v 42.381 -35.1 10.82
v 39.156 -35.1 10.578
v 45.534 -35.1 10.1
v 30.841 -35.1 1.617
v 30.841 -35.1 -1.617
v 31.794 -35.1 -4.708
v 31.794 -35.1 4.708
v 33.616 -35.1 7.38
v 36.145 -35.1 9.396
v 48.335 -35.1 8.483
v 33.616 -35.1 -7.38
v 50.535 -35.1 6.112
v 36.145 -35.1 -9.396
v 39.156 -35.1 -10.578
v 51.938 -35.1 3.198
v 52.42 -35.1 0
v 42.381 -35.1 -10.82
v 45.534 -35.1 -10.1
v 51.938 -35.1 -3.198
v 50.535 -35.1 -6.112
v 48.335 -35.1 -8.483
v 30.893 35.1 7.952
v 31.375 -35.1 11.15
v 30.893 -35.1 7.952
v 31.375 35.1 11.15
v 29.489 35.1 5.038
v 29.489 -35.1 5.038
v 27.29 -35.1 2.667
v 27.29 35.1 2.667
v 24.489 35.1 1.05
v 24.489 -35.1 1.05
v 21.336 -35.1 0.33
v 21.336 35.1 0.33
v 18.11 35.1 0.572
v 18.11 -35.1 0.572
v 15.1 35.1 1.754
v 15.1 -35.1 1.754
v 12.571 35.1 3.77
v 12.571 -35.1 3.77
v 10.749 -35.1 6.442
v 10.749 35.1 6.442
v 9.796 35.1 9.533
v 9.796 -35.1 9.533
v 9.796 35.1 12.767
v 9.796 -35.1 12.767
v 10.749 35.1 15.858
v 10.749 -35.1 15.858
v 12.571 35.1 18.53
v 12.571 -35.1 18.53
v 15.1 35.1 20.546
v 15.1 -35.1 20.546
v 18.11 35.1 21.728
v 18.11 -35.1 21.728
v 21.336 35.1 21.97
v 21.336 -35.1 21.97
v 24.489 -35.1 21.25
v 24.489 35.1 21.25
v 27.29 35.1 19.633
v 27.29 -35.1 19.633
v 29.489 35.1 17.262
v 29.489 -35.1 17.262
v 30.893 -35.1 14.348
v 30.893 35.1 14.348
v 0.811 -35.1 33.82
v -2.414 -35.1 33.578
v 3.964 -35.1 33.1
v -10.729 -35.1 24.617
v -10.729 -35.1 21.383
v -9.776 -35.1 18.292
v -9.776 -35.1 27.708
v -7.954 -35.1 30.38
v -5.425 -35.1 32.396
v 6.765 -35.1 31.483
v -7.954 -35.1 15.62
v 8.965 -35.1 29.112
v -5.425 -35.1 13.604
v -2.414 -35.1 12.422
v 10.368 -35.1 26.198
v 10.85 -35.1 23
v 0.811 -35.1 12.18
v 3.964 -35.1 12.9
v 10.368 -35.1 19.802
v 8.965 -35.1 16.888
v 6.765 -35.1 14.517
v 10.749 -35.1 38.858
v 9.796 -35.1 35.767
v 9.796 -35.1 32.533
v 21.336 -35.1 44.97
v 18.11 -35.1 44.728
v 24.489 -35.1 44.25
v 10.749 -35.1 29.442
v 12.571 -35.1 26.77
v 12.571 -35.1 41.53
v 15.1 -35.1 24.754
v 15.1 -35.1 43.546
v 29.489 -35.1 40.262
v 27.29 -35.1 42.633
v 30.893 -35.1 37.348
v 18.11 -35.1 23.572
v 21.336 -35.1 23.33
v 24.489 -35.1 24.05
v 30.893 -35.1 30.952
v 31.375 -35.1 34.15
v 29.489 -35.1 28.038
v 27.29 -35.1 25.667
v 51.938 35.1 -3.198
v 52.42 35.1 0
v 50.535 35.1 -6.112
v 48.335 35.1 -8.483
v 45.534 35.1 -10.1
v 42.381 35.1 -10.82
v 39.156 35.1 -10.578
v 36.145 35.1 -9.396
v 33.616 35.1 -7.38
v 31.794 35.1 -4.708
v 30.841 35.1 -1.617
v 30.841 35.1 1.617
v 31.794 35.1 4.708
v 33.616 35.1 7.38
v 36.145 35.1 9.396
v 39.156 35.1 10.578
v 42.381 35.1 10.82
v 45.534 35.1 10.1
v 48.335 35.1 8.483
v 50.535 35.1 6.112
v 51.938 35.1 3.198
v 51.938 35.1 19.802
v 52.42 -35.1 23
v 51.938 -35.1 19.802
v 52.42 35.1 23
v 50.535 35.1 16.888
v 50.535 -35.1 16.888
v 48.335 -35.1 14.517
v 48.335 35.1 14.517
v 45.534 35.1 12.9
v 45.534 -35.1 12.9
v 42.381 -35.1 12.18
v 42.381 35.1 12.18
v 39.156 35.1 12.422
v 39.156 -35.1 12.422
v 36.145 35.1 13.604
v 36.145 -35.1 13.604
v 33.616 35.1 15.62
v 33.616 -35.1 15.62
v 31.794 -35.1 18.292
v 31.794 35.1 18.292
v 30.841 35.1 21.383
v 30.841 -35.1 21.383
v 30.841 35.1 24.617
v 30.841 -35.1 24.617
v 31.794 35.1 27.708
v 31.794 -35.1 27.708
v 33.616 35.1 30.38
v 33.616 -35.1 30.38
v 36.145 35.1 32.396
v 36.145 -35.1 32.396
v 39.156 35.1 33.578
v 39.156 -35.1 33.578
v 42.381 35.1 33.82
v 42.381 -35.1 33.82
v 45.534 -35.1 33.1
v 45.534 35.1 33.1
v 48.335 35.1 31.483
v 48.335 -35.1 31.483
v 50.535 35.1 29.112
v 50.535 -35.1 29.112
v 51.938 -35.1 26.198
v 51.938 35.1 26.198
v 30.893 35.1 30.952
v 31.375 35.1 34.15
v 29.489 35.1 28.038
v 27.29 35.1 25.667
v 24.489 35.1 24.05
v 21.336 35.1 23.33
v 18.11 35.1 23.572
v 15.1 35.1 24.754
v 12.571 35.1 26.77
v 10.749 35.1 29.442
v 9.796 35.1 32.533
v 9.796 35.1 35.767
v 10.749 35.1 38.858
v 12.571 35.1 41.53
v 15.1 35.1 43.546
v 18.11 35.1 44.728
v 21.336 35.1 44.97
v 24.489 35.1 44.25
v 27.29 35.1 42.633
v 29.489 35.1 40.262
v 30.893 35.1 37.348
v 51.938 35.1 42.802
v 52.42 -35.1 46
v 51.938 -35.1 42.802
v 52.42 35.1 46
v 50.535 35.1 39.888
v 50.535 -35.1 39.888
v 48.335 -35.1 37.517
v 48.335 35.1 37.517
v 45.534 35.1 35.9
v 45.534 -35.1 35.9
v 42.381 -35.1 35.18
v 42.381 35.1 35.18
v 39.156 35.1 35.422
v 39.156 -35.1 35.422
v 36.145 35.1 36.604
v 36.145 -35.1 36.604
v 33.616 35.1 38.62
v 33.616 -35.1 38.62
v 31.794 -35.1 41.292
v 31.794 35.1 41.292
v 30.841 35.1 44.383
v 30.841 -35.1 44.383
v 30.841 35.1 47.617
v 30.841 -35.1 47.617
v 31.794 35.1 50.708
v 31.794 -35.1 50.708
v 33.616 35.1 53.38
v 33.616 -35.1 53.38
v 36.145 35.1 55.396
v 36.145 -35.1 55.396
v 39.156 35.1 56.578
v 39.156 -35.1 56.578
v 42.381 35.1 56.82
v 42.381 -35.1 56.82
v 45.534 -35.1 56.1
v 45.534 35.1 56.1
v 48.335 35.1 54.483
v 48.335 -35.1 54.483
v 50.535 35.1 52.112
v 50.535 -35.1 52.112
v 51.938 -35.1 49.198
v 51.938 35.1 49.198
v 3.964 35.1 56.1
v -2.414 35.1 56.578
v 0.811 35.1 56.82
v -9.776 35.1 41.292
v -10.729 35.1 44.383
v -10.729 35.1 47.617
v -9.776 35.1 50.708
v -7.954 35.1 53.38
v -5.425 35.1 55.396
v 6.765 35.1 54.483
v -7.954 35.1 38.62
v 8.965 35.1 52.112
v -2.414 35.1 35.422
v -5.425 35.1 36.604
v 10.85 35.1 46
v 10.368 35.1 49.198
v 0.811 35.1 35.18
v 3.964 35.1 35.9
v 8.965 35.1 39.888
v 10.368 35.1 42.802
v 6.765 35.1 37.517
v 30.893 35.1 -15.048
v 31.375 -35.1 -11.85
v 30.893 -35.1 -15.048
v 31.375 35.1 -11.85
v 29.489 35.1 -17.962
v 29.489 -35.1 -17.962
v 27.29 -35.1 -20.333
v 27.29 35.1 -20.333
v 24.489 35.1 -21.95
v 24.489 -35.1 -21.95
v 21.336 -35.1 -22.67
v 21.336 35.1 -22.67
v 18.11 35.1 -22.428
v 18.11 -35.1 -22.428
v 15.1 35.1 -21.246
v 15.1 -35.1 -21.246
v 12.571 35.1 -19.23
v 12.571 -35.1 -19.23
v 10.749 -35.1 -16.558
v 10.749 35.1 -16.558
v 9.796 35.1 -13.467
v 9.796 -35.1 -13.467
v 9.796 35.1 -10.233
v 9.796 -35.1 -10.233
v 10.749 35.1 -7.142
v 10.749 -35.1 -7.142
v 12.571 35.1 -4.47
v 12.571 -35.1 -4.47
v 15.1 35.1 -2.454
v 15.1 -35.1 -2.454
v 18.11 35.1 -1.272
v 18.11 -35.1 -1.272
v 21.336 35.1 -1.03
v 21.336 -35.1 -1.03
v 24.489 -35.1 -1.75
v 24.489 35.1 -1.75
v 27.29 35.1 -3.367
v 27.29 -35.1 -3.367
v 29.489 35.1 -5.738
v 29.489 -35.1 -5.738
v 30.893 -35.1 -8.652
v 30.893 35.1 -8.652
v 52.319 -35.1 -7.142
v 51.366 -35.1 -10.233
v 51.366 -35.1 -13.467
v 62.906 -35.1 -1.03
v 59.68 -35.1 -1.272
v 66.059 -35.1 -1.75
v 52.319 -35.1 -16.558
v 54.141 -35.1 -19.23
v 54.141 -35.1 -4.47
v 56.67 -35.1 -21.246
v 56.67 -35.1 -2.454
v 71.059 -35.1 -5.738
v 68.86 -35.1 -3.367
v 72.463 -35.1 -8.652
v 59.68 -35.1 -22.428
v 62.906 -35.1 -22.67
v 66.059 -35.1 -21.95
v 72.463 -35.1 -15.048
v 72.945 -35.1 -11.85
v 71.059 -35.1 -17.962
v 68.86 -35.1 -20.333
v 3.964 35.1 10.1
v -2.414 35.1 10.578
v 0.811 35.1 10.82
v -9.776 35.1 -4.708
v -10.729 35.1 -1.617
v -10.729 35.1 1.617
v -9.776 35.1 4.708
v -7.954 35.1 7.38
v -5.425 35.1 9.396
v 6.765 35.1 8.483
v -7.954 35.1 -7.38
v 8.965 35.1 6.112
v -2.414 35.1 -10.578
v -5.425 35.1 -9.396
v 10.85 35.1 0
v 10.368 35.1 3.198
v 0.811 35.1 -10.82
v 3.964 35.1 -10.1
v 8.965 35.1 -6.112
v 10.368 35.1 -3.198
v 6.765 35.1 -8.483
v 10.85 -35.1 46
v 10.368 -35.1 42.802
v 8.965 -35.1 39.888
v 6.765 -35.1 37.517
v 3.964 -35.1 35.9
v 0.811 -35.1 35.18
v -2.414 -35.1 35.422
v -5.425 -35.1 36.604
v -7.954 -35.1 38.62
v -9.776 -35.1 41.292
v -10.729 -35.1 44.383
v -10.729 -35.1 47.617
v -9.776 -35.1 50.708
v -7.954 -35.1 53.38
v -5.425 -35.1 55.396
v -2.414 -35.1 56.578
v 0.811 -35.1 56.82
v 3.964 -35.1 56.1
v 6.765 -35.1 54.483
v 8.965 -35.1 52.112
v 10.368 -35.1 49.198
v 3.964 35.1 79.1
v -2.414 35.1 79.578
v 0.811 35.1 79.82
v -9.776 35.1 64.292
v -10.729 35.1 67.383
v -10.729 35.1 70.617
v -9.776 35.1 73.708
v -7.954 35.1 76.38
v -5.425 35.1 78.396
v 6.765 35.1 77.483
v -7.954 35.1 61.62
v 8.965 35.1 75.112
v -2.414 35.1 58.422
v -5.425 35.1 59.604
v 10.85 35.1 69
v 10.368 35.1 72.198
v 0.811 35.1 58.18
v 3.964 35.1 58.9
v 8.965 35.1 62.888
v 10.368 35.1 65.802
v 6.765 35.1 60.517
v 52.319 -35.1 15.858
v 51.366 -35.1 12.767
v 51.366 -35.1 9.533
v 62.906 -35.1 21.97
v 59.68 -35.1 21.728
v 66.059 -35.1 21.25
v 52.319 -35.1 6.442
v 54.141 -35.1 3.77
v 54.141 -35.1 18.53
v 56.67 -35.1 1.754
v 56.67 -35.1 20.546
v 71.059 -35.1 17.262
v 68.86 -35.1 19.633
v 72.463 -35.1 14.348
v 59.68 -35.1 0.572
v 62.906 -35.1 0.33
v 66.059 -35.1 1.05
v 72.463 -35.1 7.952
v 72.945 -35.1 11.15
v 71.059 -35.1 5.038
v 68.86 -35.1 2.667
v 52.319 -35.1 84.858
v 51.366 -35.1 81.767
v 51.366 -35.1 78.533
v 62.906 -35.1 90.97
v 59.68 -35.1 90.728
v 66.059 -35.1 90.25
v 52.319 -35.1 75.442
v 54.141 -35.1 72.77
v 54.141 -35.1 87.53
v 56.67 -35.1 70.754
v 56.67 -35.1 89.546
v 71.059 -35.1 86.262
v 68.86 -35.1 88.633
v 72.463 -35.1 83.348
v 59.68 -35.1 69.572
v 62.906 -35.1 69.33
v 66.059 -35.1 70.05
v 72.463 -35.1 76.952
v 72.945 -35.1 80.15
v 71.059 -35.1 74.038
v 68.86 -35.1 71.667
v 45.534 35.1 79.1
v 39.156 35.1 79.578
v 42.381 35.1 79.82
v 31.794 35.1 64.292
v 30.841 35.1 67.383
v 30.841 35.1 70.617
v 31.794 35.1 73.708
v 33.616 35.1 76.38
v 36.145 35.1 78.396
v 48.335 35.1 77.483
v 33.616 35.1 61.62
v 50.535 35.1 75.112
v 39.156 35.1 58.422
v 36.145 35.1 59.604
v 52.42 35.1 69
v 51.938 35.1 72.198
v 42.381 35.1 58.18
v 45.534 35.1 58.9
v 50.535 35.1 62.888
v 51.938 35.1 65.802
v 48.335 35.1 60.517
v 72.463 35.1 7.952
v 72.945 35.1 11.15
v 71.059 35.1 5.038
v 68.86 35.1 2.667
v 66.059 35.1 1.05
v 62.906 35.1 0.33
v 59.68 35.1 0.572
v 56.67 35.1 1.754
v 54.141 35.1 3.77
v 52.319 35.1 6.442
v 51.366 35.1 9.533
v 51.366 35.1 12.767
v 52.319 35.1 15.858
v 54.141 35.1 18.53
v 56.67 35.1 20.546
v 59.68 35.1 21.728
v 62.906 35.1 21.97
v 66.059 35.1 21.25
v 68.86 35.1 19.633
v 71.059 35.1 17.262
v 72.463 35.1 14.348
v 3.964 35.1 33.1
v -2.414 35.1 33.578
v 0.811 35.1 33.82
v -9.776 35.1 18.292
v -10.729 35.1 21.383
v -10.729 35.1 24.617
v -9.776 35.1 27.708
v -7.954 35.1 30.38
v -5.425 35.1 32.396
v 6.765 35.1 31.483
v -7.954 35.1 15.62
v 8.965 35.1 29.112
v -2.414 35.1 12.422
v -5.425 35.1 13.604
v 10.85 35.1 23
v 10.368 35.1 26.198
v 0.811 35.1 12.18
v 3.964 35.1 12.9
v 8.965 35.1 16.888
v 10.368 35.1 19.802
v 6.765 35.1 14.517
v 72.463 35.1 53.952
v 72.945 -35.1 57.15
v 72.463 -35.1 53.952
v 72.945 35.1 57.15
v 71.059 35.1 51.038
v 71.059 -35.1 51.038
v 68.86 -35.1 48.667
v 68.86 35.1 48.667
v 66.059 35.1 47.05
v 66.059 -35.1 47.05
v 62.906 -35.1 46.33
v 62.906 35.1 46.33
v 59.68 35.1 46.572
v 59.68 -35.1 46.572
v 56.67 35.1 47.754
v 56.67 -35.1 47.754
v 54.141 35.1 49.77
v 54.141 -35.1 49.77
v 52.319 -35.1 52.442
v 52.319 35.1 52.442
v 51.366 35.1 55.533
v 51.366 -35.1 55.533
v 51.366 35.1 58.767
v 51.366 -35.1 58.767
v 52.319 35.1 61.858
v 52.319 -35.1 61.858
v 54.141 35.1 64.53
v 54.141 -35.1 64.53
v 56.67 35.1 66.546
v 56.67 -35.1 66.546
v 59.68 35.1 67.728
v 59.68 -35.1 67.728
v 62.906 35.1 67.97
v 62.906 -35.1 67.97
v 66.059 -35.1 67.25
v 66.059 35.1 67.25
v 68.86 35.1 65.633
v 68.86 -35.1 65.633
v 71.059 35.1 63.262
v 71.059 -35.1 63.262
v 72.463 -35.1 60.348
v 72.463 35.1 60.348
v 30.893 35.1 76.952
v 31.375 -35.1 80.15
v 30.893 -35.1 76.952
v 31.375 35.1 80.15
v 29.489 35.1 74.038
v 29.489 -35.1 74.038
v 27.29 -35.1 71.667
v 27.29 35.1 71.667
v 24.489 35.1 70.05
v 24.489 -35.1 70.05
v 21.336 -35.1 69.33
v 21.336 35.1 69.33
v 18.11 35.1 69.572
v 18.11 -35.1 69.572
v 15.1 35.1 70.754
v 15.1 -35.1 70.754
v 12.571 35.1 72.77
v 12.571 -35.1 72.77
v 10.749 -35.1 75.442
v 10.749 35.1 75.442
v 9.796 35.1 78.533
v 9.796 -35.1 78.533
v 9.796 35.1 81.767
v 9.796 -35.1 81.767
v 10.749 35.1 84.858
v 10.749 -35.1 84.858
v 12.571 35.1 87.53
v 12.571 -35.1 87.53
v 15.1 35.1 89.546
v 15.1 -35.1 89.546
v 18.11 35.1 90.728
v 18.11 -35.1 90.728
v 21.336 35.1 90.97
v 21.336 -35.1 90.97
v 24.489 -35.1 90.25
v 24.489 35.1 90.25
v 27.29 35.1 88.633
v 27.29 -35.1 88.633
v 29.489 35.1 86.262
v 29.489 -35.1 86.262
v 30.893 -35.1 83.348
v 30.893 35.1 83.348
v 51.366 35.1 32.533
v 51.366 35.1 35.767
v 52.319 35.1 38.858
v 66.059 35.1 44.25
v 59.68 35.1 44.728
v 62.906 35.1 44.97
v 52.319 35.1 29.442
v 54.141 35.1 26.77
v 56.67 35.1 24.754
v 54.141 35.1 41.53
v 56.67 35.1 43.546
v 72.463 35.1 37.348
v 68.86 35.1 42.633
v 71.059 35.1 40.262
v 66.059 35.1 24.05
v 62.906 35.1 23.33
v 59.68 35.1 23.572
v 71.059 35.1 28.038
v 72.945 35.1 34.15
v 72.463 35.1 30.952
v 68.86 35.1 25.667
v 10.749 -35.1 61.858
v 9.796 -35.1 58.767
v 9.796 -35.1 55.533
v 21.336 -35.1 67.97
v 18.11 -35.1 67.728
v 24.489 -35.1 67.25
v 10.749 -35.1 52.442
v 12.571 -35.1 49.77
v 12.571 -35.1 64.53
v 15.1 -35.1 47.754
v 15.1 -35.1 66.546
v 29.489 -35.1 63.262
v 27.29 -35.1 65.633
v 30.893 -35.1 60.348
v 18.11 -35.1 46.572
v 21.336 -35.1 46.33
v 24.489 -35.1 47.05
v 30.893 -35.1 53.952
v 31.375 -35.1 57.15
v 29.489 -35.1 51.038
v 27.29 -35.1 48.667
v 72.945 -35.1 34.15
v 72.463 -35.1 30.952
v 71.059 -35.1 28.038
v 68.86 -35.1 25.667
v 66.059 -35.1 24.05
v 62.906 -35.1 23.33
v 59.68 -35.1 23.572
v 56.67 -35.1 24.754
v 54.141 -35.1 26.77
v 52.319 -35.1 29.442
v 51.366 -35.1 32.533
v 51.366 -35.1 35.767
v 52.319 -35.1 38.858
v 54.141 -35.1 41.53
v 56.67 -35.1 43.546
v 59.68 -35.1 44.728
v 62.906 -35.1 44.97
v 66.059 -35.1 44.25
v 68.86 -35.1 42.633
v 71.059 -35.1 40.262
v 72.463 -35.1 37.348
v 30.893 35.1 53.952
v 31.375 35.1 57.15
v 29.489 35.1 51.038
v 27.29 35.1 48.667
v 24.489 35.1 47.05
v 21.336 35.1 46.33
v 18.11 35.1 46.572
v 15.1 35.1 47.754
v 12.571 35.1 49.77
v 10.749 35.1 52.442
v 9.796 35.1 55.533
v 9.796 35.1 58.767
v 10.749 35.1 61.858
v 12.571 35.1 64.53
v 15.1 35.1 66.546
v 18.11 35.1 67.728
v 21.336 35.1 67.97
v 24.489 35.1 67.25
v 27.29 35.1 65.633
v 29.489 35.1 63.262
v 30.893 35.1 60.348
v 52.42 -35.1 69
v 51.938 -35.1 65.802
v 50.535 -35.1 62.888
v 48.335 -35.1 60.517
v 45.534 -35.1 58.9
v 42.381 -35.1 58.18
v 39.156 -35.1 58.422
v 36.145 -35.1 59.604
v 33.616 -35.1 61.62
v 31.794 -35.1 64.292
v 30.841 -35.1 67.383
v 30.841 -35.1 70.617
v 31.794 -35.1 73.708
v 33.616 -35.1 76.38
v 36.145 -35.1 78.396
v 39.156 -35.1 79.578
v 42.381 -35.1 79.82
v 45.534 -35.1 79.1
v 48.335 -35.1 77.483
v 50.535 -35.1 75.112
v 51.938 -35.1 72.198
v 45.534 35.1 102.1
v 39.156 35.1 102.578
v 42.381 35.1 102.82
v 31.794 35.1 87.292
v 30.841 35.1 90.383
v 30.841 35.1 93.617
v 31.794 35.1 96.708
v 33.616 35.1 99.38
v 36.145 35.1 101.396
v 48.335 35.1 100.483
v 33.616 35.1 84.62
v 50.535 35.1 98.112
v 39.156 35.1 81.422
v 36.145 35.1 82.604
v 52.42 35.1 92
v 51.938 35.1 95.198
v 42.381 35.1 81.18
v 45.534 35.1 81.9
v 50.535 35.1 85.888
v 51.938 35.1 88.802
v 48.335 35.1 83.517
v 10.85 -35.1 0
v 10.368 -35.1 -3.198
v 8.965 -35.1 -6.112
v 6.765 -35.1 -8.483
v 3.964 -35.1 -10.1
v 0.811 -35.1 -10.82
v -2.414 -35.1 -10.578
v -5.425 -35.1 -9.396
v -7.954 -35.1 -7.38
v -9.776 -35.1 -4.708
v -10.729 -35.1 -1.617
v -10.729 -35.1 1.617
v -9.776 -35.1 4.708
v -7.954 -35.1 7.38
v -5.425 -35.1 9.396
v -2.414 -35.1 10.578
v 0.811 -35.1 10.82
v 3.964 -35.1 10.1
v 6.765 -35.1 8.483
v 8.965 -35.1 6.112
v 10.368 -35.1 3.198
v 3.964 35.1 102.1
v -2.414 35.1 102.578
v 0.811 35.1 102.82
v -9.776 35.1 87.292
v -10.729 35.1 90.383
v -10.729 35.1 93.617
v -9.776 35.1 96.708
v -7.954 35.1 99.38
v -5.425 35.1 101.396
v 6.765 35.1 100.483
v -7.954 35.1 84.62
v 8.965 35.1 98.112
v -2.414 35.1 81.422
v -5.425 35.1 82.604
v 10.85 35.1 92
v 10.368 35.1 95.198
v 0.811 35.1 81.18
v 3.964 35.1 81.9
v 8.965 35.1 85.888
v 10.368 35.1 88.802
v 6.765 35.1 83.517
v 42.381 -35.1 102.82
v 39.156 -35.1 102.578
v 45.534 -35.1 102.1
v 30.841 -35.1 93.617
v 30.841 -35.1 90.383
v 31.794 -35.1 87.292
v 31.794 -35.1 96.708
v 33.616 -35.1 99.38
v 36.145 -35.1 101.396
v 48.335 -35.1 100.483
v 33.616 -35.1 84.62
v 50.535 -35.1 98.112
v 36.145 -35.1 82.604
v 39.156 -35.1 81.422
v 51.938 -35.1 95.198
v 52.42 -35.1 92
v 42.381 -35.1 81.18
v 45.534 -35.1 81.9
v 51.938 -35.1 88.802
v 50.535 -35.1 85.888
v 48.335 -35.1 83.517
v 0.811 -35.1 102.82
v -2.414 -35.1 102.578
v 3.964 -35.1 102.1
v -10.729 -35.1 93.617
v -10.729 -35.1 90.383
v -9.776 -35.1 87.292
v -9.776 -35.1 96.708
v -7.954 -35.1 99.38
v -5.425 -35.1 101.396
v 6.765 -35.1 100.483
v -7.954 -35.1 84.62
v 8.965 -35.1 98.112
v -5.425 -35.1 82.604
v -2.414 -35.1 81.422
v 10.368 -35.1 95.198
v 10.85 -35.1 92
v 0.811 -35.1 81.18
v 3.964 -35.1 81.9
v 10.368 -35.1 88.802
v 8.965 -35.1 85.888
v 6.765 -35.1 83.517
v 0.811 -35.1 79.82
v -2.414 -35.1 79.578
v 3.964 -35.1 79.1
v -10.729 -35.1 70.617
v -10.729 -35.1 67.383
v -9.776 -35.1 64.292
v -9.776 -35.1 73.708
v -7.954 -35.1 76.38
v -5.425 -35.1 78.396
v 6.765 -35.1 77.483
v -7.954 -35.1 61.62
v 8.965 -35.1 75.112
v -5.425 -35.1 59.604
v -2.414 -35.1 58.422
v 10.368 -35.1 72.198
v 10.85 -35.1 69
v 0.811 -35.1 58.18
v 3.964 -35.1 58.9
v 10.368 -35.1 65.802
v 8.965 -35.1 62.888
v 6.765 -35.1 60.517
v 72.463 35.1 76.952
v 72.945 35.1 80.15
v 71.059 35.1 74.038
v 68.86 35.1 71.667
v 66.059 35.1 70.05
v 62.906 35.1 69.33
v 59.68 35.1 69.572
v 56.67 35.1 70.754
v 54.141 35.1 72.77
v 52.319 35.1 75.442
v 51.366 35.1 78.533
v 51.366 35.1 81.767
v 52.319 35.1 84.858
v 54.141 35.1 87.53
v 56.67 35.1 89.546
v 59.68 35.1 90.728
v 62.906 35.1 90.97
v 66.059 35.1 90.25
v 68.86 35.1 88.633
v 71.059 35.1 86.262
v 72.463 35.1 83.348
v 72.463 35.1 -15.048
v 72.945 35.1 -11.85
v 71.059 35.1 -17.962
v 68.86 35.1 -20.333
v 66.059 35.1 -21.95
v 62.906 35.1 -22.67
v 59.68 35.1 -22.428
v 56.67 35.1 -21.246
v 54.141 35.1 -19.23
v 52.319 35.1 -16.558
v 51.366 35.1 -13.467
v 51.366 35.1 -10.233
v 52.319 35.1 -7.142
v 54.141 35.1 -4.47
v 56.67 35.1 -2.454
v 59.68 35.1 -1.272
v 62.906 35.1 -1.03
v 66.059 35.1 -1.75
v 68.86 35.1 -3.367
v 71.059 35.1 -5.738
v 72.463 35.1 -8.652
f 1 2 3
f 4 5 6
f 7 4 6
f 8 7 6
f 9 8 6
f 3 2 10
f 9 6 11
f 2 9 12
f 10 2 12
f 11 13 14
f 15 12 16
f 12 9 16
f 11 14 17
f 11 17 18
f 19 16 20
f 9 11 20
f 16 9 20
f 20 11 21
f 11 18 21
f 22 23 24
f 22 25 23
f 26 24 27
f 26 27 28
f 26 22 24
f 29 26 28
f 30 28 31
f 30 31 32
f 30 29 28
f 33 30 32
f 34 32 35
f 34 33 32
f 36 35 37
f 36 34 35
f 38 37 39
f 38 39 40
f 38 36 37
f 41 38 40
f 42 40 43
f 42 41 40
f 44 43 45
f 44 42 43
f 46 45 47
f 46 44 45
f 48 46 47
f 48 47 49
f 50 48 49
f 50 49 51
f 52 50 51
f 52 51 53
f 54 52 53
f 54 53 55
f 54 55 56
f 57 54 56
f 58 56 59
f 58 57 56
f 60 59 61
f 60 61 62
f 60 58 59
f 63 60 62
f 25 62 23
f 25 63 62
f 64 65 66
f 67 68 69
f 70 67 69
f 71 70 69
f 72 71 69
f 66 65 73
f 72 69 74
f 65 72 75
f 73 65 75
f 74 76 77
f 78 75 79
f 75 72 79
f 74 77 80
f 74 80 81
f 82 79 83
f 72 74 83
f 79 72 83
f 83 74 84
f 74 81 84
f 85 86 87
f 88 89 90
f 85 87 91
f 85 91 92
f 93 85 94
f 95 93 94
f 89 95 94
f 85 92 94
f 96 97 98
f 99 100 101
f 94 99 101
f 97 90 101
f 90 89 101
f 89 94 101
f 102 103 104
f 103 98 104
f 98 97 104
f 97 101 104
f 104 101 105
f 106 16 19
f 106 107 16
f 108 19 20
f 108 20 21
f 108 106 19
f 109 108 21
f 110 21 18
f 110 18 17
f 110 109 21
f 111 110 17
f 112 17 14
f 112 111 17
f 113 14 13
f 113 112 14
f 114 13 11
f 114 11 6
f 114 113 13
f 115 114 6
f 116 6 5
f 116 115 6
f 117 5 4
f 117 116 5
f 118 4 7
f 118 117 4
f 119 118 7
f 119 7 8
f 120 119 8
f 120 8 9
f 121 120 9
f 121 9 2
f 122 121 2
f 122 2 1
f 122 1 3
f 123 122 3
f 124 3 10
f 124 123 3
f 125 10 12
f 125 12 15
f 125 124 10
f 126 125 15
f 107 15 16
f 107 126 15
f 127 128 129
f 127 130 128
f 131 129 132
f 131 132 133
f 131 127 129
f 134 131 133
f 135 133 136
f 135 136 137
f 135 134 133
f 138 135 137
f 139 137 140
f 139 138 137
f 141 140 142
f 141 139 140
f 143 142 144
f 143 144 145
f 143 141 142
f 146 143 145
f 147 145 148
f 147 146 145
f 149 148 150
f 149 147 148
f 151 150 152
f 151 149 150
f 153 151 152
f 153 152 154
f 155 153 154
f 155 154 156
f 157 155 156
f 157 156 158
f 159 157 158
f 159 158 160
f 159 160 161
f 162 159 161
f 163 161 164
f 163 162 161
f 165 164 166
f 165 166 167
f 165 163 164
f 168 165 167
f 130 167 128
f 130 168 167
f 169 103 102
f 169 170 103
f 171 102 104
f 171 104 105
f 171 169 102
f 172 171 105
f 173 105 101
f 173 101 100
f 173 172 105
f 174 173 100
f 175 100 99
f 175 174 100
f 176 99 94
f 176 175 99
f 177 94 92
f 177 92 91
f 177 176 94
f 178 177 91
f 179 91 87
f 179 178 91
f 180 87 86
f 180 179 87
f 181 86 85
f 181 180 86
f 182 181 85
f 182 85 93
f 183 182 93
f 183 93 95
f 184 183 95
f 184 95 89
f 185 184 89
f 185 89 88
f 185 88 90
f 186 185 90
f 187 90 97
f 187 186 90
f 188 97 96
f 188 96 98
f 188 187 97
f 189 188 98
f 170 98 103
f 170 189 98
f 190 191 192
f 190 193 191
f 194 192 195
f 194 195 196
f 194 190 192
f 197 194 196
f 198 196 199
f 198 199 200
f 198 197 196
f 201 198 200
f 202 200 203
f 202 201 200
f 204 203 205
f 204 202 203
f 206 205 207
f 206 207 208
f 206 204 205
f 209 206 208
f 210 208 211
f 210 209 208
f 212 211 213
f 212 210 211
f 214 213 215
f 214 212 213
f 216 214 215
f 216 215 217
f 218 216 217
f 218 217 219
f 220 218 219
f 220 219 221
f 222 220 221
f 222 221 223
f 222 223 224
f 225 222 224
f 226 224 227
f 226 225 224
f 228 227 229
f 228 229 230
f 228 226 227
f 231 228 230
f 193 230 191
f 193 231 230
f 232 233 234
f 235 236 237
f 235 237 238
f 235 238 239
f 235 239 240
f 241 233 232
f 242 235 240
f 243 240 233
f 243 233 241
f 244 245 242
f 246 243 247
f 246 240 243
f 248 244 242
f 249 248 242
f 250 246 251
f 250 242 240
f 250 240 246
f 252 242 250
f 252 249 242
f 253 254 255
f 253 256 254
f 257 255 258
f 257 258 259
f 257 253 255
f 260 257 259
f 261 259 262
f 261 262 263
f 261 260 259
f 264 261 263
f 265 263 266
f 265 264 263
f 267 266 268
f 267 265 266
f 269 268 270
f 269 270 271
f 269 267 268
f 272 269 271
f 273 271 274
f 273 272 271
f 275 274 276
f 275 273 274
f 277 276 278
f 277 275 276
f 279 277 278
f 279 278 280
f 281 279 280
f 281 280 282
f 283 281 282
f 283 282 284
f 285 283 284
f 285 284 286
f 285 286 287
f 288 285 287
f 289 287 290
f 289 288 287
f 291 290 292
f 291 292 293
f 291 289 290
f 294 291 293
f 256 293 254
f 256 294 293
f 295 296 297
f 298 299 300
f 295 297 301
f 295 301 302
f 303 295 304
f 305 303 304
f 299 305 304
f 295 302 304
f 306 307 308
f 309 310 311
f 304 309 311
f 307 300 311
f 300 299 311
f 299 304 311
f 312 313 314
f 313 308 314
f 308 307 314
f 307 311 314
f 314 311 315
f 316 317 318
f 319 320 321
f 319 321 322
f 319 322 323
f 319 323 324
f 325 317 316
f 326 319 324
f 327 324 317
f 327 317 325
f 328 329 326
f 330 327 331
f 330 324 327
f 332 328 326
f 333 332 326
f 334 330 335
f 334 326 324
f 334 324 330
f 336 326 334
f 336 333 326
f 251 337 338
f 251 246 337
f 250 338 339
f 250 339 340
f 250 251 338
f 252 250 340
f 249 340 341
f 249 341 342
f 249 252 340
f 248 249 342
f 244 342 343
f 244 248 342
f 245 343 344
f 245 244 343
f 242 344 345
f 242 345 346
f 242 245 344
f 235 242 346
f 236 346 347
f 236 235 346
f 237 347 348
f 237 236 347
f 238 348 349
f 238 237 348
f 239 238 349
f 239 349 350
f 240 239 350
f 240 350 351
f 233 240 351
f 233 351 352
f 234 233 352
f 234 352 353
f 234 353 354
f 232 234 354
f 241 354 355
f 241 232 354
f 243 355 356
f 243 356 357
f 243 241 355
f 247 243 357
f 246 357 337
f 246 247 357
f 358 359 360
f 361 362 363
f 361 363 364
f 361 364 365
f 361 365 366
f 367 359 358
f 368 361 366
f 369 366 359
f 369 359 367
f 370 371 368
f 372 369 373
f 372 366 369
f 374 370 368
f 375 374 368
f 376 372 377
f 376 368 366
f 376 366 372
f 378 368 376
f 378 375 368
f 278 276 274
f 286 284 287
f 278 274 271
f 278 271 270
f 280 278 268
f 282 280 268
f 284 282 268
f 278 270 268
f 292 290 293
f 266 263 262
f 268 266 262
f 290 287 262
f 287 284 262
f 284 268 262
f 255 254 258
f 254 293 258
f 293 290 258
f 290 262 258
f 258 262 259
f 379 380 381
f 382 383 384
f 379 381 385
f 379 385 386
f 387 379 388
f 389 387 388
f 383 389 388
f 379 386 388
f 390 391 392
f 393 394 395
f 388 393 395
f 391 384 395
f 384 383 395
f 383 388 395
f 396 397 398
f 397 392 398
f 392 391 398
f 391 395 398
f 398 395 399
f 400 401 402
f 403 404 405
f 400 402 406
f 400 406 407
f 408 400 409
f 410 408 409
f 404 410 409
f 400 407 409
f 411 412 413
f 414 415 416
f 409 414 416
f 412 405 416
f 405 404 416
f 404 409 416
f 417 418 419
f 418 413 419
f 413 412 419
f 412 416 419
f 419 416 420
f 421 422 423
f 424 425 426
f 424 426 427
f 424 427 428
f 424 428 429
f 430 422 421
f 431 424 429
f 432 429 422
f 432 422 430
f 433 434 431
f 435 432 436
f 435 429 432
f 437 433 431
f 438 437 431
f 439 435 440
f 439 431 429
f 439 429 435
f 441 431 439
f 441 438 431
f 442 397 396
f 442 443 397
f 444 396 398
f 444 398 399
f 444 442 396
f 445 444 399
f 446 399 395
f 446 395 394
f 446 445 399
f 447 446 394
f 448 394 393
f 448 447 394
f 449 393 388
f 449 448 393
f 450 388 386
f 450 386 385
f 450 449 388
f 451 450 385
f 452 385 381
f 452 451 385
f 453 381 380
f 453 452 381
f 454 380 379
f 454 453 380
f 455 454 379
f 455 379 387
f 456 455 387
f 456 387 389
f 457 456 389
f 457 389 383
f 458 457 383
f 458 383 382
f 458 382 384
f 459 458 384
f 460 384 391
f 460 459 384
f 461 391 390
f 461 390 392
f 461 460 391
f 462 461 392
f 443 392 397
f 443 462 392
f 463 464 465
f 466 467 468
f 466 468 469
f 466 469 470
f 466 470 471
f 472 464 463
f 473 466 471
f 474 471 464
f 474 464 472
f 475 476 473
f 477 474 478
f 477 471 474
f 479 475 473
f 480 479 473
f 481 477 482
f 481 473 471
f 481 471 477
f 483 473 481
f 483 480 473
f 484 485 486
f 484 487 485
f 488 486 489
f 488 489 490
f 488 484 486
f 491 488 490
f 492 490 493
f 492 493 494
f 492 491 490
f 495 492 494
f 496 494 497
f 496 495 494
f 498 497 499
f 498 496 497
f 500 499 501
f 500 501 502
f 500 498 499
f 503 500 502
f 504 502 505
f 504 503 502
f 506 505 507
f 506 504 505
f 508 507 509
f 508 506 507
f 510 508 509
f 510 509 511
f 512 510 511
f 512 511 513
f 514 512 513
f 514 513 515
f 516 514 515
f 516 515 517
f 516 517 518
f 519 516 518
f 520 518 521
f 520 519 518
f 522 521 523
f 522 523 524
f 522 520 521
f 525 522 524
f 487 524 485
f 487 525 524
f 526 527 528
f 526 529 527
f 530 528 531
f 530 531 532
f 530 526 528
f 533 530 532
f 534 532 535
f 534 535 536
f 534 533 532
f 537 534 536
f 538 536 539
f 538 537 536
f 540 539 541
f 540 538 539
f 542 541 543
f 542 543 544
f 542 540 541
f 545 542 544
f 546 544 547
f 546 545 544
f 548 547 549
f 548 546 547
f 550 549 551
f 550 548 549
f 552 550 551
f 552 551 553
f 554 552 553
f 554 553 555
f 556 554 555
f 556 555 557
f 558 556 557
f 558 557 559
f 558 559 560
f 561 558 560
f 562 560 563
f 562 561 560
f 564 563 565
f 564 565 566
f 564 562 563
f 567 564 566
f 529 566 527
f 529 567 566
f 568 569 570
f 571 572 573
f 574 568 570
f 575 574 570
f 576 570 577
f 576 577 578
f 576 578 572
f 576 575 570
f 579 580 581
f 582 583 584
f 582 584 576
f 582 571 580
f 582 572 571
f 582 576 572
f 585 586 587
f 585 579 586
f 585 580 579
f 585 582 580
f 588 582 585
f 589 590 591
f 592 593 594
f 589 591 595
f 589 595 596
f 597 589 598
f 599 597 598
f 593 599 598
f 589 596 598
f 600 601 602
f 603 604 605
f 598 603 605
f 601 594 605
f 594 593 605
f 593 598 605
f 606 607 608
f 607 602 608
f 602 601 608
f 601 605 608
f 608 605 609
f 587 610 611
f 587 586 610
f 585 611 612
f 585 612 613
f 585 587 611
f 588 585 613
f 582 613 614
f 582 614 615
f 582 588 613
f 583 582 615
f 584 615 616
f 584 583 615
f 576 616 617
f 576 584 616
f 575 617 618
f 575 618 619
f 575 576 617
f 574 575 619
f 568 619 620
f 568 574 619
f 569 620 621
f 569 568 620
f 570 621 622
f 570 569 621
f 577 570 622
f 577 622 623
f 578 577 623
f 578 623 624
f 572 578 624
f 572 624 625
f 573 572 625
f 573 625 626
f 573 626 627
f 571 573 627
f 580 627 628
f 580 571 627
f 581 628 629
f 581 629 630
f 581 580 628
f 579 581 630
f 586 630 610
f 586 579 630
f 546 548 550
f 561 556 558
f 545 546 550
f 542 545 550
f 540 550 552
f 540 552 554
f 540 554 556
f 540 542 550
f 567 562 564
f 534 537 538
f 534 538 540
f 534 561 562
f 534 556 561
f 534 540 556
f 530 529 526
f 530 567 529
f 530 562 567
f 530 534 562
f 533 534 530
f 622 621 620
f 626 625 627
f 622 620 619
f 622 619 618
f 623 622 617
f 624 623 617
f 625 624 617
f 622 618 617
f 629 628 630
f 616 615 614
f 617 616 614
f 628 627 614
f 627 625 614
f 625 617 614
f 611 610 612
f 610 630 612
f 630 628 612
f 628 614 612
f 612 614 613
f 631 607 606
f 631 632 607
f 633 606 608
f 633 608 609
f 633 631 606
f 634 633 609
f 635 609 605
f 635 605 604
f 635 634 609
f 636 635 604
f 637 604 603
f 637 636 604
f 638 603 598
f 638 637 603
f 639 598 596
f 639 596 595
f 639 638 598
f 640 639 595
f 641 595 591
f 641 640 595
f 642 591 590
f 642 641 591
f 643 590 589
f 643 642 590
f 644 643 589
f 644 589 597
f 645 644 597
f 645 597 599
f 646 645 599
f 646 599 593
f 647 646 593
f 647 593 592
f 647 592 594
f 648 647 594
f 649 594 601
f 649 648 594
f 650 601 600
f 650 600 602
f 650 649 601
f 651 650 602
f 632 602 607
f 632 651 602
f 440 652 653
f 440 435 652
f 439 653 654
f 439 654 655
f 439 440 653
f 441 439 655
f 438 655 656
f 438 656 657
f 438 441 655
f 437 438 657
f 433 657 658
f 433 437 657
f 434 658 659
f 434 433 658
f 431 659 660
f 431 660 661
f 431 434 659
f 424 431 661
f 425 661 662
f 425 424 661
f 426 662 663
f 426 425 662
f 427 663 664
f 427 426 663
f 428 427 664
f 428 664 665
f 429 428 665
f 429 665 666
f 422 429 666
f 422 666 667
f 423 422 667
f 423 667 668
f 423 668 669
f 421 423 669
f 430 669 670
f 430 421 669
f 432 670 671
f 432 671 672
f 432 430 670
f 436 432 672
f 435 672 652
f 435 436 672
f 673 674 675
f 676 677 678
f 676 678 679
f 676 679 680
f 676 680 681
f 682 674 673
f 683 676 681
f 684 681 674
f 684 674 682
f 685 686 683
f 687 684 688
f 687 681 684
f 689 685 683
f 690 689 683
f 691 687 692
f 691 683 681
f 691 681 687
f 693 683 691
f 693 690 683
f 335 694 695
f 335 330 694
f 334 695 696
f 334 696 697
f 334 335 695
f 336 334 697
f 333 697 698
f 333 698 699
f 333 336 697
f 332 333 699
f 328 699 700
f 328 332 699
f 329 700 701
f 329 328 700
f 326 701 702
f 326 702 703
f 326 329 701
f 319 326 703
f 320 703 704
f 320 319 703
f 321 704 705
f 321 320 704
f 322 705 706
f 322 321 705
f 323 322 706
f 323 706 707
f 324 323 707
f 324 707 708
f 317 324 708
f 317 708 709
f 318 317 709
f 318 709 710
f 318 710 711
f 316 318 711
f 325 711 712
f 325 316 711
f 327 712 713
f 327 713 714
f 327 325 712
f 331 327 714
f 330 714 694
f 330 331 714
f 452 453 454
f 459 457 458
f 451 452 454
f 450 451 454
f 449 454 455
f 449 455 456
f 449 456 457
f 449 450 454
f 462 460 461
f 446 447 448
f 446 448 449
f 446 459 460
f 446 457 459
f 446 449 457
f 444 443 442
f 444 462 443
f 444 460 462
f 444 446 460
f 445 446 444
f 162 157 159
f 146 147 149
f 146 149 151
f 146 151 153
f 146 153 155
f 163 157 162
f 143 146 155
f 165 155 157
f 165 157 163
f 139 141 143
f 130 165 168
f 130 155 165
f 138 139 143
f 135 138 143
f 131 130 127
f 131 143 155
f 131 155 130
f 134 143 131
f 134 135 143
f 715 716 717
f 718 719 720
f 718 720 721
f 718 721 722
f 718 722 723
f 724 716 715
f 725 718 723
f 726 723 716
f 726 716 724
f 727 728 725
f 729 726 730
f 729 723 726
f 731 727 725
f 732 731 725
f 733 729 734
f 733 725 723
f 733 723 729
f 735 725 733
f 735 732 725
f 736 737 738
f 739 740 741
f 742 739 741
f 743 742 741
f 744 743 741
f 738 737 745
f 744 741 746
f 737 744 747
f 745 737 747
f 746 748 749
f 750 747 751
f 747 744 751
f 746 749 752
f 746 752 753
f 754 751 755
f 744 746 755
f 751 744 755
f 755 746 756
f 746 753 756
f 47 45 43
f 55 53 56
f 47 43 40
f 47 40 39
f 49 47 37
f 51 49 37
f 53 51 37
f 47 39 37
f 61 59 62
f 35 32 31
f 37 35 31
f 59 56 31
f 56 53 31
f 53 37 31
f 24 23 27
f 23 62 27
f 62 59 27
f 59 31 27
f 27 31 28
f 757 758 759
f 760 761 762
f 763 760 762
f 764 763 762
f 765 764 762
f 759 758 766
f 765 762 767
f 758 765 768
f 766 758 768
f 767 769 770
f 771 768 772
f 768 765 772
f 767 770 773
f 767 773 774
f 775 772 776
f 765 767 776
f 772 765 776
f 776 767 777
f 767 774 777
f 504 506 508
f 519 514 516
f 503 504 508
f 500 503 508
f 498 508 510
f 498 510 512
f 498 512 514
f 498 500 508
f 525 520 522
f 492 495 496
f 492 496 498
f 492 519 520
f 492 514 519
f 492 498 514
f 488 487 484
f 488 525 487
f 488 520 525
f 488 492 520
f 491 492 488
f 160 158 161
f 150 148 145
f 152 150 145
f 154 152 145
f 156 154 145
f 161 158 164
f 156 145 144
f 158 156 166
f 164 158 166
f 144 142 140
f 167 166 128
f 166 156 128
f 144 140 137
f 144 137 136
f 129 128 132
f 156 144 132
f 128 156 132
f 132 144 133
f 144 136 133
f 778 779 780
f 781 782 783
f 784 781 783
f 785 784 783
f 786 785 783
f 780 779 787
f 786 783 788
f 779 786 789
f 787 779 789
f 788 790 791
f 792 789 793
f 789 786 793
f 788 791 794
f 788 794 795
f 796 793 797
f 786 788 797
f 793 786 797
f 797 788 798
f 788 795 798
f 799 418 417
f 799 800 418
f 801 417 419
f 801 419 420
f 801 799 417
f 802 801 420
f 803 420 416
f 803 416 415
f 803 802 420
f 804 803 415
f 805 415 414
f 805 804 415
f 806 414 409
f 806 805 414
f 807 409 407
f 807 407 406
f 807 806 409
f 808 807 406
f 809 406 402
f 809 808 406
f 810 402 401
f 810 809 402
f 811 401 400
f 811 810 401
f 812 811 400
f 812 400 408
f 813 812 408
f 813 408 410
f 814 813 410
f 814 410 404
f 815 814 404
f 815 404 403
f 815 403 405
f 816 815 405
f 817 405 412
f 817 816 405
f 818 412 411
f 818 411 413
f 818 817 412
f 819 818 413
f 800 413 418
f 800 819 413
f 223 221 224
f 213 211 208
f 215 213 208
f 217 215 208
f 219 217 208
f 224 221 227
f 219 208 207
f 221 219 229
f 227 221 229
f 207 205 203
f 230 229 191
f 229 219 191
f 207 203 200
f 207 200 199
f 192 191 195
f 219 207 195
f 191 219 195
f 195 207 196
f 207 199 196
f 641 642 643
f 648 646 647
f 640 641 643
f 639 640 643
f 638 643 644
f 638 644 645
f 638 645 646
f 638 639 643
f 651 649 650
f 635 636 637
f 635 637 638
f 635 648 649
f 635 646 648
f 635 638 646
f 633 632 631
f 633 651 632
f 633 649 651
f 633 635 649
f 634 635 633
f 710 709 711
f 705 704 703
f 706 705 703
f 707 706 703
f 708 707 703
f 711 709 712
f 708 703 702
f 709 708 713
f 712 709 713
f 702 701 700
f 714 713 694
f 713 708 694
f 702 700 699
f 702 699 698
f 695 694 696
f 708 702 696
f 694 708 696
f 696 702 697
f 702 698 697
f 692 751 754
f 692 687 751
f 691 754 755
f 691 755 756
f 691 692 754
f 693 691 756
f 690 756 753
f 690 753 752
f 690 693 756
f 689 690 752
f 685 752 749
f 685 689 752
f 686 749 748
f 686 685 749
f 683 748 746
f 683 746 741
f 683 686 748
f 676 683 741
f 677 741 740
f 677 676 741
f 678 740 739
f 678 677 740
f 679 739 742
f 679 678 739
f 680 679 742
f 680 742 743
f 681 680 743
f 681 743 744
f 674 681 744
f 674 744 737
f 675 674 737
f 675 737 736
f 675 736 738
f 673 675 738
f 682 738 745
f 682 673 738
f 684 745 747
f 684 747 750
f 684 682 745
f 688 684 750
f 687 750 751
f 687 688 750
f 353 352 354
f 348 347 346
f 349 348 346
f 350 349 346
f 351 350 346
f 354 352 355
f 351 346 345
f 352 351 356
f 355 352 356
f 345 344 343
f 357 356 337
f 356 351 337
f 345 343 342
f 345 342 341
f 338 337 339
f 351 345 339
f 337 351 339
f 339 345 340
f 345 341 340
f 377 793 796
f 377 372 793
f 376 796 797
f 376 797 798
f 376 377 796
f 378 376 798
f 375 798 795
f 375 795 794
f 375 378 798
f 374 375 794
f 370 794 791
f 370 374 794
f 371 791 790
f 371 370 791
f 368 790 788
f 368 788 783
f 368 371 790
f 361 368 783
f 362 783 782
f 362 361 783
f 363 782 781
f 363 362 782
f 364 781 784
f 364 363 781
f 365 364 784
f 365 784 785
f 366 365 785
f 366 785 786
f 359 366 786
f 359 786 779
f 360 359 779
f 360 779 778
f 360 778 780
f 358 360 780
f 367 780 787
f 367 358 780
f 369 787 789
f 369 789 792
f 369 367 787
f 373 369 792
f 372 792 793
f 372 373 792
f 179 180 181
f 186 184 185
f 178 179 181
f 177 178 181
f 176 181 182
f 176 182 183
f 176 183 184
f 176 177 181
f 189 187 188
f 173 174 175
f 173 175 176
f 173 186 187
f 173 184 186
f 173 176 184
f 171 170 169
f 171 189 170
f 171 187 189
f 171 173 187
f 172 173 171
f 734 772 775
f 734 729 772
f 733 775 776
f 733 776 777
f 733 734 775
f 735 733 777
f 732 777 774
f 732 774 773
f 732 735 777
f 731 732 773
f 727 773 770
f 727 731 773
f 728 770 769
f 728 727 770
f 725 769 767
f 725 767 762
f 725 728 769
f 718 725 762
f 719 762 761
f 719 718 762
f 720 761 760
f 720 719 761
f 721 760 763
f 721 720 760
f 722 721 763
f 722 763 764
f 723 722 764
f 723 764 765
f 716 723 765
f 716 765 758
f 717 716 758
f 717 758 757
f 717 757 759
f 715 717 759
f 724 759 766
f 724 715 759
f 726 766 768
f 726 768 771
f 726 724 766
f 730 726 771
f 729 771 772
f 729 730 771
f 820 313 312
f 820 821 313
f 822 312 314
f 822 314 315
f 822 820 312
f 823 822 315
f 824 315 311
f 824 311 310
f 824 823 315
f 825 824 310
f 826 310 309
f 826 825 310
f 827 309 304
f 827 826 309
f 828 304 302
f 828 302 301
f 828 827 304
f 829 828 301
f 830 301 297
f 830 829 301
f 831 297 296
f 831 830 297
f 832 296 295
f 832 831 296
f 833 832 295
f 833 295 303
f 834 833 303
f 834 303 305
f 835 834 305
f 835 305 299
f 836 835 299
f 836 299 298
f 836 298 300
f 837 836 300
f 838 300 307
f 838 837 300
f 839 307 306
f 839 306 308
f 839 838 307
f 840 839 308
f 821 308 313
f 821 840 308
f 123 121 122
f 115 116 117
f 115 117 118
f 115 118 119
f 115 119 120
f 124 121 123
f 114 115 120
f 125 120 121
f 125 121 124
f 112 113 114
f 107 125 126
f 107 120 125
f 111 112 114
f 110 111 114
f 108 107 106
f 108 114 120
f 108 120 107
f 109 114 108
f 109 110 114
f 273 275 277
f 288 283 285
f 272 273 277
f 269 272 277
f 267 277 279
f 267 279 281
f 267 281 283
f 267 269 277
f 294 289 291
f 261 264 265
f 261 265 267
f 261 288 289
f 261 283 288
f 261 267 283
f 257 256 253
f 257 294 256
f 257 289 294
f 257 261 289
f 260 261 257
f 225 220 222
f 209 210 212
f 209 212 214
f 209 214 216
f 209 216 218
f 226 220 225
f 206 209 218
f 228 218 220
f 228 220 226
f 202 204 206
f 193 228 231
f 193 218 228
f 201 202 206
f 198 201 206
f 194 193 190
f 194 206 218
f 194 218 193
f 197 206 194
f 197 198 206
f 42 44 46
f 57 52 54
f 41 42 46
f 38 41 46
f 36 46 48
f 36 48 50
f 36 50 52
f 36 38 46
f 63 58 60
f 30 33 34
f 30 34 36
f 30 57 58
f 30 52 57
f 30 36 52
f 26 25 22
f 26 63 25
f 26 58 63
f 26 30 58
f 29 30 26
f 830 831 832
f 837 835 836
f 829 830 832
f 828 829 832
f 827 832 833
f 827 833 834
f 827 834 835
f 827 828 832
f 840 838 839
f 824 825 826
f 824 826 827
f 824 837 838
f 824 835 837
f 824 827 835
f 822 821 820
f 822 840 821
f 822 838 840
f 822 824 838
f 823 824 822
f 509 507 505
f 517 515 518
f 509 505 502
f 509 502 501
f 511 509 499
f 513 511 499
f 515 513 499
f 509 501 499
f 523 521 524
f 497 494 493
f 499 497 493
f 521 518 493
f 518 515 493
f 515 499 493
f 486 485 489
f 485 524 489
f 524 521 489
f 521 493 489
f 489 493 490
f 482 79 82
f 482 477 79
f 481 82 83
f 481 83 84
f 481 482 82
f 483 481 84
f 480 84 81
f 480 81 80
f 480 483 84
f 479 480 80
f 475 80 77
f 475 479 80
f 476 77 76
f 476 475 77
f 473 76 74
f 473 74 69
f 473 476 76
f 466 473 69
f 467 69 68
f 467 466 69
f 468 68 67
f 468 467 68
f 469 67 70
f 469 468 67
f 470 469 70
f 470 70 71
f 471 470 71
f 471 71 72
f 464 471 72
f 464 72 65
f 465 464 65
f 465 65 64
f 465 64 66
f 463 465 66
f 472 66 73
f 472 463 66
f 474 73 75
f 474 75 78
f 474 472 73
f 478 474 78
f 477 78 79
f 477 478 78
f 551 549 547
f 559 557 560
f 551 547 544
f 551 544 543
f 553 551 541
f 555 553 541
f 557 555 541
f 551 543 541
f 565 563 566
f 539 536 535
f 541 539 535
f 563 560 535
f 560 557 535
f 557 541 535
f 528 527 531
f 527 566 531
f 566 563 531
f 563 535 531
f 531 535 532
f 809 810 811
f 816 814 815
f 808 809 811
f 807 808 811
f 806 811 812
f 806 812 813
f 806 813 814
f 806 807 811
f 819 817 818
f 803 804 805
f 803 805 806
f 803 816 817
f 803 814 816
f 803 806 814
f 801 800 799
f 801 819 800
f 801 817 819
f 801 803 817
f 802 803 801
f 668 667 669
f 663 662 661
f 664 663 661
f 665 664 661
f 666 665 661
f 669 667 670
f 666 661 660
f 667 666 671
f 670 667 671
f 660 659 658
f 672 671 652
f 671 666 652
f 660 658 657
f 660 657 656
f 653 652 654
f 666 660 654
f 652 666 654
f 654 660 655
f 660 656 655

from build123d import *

# Parameters (mm, degrees)
SKETCH1_R                    = 10.85
MOLICELLL_21700_4S5P_DEPTH   = 35.1
MOLICELLL_21700_4S5P_2_DEPTH = 35.1
LPATTERN1_COUNT              = 5
LPATTERN1_PITCH              = 23
LPATTERN2_COUNT              = 2
LPATTERN2_PITCH              = 41.57


with BuildPart() as part:
    # Sketch1 → Molicelll 21700 - 4s5p (new body, symmetric)
    with BuildSketch(Plane(origin=(0, 0, 0), x_dir=(1, 0, 0), z_dir=(0, 1, 0))):
        Circle(SKETCH1_R)
    extrude(amount=MOLICELLL_21700_4S5P_DEPTH, both=True)


with BuildPart() as body_2:
    # Sketch1 → Molicelll 21700 - 4s5p 2 (new body, symmetric)
    with BuildSketch(Plane(origin=(0, 0, 0), x_dir=(1, 0, 0), z_dir=(0, 1, 0))):
        with Locations((20.52480207, 11.85)):
            Circle(SKETCH1_R)
    extrude(amount=MOLICELLL_21700_4S5P_2_DEPTH, both=True)


with BuildPart() as lpattern1_1:
    # LPattern1: pattern copy
    add(part.part.moved(Location(Vector(0, 0, 1) * (1 * LPATTERN1_PITCH))))


with BuildPart() as lpattern1_2:
    # LPattern1: pattern copy
    add(part.part.moved(Location(Vector(0, 0, 1) * (2 * LPATTERN1_PITCH))))


with BuildPart() as lpattern1_3:
    # LPattern1: pattern copy
    add(part.part.moved(Location(Vector(0, 0, 1) * (3 * LPATTERN1_PITCH))))


with BuildPart() as lpattern1_4:
    # LPattern1: pattern copy
    add(part.part.moved(Location(Vector(0, 0, 1) * (4 * LPATTERN1_PITCH))))


with BuildPart() as lpattern1_5:
    # LPattern1: pattern copy
    add(body_2.part.moved(Location(Vector(0, 0, 1) * (1 * LPATTERN1_PITCH))))


with BuildPart() as lpattern1_6:
    # LPattern1: pattern copy
    add(body_2.part.moved(Location(Vector(0, 0, 1) * (2 * LPATTERN1_PITCH))))


with BuildPart() as lpattern1_7:
    # LPattern1: pattern copy
    add(body_2.part.moved(Location(Vector(0, 0, 1) * (3 * LPATTERN1_PITCH))))


with BuildPart() as lpattern1_8:
    # LPattern1: pattern copy
    add(body_2.part.moved(Location(Vector(0, 0, 1) * (4 * LPATTERN1_PITCH))))


with BuildPart() as lpattern2_1:
    # LPattern2: pattern copy
    add(part.part.moved(Location(Vector(1, 0, 0) * (1 * LPATTERN2_PITCH))))


with BuildPart() as lpattern2_2:
    # LPattern2: pattern copy
    add(body_2.part.moved(Location(Vector(1, 0, 0) * (1 * LPATTERN2_PITCH))))


with BuildPart() as lpattern2_3:
    # LPattern2: pattern copy
    add(lpattern1_1.part.moved(Location(Vector(1, 0, 0) * (1 * LPATTERN2_PITCH))))


with BuildPart() as lpattern2_4:
    # LPattern2: pattern copy
    add(lpattern1_5.part.moved(Location(Vector(1, 0, 0) * (1 * LPATTERN2_PITCH))))


with BuildPart() as lpattern2_5:
    # LPattern2: pattern copy
    add(lpattern1_2.part.moved(Location(Vector(1, 0, 0) * (1 * LPATTERN2_PITCH))))


with BuildPart() as lpattern2_6:
    # LPattern2: pattern copy
    add(lpattern1_6.part.moved(Location(Vector(1, 0, 0) * (1 * LPATTERN2_PITCH))))


with BuildPart() as lpattern2_7:
    # LPattern2: pattern copy
    add(lpattern1_3.part.moved(Location(Vector(1, 0, 0) * (1 * LPATTERN2_PITCH))))


with BuildPart() as lpattern2_8:
    # LPattern2: pattern copy
    add(lpattern1_7.part.moved(Location(Vector(1, 0, 0) * (1 * LPATTERN2_PITCH))))


with BuildPart() as lpattern2_9:
    # LPattern2: pattern copy
    add(lpattern1_4.part.moved(Location(Vector(1, 0, 0) * (1 * LPATTERN2_PITCH))))


with BuildPart() as lpattern2_10:
    # LPattern2: pattern copy
    add(lpattern1_8.part.moved(Location(Vector(1, 0, 0) * (1 * LPATTERN2_PITCH))))


solid = Compound([part.part, body_2.part, lpattern1_1.part, lpattern1_2.part, lpattern1_3.part, lpattern1_4.part, lpattern1_5.part, lpattern1_6.part, lpattern1_7.part, lpattern1_8.part, lpattern2_1.part, lpattern2_2.part, lpattern2_3.part, lpattern2_4.part, lpattern2_5.part, lpattern2_6.part, lpattern2_7.part, lpattern2_8.part, lpattern2_9.part, lpattern2_10.part])
